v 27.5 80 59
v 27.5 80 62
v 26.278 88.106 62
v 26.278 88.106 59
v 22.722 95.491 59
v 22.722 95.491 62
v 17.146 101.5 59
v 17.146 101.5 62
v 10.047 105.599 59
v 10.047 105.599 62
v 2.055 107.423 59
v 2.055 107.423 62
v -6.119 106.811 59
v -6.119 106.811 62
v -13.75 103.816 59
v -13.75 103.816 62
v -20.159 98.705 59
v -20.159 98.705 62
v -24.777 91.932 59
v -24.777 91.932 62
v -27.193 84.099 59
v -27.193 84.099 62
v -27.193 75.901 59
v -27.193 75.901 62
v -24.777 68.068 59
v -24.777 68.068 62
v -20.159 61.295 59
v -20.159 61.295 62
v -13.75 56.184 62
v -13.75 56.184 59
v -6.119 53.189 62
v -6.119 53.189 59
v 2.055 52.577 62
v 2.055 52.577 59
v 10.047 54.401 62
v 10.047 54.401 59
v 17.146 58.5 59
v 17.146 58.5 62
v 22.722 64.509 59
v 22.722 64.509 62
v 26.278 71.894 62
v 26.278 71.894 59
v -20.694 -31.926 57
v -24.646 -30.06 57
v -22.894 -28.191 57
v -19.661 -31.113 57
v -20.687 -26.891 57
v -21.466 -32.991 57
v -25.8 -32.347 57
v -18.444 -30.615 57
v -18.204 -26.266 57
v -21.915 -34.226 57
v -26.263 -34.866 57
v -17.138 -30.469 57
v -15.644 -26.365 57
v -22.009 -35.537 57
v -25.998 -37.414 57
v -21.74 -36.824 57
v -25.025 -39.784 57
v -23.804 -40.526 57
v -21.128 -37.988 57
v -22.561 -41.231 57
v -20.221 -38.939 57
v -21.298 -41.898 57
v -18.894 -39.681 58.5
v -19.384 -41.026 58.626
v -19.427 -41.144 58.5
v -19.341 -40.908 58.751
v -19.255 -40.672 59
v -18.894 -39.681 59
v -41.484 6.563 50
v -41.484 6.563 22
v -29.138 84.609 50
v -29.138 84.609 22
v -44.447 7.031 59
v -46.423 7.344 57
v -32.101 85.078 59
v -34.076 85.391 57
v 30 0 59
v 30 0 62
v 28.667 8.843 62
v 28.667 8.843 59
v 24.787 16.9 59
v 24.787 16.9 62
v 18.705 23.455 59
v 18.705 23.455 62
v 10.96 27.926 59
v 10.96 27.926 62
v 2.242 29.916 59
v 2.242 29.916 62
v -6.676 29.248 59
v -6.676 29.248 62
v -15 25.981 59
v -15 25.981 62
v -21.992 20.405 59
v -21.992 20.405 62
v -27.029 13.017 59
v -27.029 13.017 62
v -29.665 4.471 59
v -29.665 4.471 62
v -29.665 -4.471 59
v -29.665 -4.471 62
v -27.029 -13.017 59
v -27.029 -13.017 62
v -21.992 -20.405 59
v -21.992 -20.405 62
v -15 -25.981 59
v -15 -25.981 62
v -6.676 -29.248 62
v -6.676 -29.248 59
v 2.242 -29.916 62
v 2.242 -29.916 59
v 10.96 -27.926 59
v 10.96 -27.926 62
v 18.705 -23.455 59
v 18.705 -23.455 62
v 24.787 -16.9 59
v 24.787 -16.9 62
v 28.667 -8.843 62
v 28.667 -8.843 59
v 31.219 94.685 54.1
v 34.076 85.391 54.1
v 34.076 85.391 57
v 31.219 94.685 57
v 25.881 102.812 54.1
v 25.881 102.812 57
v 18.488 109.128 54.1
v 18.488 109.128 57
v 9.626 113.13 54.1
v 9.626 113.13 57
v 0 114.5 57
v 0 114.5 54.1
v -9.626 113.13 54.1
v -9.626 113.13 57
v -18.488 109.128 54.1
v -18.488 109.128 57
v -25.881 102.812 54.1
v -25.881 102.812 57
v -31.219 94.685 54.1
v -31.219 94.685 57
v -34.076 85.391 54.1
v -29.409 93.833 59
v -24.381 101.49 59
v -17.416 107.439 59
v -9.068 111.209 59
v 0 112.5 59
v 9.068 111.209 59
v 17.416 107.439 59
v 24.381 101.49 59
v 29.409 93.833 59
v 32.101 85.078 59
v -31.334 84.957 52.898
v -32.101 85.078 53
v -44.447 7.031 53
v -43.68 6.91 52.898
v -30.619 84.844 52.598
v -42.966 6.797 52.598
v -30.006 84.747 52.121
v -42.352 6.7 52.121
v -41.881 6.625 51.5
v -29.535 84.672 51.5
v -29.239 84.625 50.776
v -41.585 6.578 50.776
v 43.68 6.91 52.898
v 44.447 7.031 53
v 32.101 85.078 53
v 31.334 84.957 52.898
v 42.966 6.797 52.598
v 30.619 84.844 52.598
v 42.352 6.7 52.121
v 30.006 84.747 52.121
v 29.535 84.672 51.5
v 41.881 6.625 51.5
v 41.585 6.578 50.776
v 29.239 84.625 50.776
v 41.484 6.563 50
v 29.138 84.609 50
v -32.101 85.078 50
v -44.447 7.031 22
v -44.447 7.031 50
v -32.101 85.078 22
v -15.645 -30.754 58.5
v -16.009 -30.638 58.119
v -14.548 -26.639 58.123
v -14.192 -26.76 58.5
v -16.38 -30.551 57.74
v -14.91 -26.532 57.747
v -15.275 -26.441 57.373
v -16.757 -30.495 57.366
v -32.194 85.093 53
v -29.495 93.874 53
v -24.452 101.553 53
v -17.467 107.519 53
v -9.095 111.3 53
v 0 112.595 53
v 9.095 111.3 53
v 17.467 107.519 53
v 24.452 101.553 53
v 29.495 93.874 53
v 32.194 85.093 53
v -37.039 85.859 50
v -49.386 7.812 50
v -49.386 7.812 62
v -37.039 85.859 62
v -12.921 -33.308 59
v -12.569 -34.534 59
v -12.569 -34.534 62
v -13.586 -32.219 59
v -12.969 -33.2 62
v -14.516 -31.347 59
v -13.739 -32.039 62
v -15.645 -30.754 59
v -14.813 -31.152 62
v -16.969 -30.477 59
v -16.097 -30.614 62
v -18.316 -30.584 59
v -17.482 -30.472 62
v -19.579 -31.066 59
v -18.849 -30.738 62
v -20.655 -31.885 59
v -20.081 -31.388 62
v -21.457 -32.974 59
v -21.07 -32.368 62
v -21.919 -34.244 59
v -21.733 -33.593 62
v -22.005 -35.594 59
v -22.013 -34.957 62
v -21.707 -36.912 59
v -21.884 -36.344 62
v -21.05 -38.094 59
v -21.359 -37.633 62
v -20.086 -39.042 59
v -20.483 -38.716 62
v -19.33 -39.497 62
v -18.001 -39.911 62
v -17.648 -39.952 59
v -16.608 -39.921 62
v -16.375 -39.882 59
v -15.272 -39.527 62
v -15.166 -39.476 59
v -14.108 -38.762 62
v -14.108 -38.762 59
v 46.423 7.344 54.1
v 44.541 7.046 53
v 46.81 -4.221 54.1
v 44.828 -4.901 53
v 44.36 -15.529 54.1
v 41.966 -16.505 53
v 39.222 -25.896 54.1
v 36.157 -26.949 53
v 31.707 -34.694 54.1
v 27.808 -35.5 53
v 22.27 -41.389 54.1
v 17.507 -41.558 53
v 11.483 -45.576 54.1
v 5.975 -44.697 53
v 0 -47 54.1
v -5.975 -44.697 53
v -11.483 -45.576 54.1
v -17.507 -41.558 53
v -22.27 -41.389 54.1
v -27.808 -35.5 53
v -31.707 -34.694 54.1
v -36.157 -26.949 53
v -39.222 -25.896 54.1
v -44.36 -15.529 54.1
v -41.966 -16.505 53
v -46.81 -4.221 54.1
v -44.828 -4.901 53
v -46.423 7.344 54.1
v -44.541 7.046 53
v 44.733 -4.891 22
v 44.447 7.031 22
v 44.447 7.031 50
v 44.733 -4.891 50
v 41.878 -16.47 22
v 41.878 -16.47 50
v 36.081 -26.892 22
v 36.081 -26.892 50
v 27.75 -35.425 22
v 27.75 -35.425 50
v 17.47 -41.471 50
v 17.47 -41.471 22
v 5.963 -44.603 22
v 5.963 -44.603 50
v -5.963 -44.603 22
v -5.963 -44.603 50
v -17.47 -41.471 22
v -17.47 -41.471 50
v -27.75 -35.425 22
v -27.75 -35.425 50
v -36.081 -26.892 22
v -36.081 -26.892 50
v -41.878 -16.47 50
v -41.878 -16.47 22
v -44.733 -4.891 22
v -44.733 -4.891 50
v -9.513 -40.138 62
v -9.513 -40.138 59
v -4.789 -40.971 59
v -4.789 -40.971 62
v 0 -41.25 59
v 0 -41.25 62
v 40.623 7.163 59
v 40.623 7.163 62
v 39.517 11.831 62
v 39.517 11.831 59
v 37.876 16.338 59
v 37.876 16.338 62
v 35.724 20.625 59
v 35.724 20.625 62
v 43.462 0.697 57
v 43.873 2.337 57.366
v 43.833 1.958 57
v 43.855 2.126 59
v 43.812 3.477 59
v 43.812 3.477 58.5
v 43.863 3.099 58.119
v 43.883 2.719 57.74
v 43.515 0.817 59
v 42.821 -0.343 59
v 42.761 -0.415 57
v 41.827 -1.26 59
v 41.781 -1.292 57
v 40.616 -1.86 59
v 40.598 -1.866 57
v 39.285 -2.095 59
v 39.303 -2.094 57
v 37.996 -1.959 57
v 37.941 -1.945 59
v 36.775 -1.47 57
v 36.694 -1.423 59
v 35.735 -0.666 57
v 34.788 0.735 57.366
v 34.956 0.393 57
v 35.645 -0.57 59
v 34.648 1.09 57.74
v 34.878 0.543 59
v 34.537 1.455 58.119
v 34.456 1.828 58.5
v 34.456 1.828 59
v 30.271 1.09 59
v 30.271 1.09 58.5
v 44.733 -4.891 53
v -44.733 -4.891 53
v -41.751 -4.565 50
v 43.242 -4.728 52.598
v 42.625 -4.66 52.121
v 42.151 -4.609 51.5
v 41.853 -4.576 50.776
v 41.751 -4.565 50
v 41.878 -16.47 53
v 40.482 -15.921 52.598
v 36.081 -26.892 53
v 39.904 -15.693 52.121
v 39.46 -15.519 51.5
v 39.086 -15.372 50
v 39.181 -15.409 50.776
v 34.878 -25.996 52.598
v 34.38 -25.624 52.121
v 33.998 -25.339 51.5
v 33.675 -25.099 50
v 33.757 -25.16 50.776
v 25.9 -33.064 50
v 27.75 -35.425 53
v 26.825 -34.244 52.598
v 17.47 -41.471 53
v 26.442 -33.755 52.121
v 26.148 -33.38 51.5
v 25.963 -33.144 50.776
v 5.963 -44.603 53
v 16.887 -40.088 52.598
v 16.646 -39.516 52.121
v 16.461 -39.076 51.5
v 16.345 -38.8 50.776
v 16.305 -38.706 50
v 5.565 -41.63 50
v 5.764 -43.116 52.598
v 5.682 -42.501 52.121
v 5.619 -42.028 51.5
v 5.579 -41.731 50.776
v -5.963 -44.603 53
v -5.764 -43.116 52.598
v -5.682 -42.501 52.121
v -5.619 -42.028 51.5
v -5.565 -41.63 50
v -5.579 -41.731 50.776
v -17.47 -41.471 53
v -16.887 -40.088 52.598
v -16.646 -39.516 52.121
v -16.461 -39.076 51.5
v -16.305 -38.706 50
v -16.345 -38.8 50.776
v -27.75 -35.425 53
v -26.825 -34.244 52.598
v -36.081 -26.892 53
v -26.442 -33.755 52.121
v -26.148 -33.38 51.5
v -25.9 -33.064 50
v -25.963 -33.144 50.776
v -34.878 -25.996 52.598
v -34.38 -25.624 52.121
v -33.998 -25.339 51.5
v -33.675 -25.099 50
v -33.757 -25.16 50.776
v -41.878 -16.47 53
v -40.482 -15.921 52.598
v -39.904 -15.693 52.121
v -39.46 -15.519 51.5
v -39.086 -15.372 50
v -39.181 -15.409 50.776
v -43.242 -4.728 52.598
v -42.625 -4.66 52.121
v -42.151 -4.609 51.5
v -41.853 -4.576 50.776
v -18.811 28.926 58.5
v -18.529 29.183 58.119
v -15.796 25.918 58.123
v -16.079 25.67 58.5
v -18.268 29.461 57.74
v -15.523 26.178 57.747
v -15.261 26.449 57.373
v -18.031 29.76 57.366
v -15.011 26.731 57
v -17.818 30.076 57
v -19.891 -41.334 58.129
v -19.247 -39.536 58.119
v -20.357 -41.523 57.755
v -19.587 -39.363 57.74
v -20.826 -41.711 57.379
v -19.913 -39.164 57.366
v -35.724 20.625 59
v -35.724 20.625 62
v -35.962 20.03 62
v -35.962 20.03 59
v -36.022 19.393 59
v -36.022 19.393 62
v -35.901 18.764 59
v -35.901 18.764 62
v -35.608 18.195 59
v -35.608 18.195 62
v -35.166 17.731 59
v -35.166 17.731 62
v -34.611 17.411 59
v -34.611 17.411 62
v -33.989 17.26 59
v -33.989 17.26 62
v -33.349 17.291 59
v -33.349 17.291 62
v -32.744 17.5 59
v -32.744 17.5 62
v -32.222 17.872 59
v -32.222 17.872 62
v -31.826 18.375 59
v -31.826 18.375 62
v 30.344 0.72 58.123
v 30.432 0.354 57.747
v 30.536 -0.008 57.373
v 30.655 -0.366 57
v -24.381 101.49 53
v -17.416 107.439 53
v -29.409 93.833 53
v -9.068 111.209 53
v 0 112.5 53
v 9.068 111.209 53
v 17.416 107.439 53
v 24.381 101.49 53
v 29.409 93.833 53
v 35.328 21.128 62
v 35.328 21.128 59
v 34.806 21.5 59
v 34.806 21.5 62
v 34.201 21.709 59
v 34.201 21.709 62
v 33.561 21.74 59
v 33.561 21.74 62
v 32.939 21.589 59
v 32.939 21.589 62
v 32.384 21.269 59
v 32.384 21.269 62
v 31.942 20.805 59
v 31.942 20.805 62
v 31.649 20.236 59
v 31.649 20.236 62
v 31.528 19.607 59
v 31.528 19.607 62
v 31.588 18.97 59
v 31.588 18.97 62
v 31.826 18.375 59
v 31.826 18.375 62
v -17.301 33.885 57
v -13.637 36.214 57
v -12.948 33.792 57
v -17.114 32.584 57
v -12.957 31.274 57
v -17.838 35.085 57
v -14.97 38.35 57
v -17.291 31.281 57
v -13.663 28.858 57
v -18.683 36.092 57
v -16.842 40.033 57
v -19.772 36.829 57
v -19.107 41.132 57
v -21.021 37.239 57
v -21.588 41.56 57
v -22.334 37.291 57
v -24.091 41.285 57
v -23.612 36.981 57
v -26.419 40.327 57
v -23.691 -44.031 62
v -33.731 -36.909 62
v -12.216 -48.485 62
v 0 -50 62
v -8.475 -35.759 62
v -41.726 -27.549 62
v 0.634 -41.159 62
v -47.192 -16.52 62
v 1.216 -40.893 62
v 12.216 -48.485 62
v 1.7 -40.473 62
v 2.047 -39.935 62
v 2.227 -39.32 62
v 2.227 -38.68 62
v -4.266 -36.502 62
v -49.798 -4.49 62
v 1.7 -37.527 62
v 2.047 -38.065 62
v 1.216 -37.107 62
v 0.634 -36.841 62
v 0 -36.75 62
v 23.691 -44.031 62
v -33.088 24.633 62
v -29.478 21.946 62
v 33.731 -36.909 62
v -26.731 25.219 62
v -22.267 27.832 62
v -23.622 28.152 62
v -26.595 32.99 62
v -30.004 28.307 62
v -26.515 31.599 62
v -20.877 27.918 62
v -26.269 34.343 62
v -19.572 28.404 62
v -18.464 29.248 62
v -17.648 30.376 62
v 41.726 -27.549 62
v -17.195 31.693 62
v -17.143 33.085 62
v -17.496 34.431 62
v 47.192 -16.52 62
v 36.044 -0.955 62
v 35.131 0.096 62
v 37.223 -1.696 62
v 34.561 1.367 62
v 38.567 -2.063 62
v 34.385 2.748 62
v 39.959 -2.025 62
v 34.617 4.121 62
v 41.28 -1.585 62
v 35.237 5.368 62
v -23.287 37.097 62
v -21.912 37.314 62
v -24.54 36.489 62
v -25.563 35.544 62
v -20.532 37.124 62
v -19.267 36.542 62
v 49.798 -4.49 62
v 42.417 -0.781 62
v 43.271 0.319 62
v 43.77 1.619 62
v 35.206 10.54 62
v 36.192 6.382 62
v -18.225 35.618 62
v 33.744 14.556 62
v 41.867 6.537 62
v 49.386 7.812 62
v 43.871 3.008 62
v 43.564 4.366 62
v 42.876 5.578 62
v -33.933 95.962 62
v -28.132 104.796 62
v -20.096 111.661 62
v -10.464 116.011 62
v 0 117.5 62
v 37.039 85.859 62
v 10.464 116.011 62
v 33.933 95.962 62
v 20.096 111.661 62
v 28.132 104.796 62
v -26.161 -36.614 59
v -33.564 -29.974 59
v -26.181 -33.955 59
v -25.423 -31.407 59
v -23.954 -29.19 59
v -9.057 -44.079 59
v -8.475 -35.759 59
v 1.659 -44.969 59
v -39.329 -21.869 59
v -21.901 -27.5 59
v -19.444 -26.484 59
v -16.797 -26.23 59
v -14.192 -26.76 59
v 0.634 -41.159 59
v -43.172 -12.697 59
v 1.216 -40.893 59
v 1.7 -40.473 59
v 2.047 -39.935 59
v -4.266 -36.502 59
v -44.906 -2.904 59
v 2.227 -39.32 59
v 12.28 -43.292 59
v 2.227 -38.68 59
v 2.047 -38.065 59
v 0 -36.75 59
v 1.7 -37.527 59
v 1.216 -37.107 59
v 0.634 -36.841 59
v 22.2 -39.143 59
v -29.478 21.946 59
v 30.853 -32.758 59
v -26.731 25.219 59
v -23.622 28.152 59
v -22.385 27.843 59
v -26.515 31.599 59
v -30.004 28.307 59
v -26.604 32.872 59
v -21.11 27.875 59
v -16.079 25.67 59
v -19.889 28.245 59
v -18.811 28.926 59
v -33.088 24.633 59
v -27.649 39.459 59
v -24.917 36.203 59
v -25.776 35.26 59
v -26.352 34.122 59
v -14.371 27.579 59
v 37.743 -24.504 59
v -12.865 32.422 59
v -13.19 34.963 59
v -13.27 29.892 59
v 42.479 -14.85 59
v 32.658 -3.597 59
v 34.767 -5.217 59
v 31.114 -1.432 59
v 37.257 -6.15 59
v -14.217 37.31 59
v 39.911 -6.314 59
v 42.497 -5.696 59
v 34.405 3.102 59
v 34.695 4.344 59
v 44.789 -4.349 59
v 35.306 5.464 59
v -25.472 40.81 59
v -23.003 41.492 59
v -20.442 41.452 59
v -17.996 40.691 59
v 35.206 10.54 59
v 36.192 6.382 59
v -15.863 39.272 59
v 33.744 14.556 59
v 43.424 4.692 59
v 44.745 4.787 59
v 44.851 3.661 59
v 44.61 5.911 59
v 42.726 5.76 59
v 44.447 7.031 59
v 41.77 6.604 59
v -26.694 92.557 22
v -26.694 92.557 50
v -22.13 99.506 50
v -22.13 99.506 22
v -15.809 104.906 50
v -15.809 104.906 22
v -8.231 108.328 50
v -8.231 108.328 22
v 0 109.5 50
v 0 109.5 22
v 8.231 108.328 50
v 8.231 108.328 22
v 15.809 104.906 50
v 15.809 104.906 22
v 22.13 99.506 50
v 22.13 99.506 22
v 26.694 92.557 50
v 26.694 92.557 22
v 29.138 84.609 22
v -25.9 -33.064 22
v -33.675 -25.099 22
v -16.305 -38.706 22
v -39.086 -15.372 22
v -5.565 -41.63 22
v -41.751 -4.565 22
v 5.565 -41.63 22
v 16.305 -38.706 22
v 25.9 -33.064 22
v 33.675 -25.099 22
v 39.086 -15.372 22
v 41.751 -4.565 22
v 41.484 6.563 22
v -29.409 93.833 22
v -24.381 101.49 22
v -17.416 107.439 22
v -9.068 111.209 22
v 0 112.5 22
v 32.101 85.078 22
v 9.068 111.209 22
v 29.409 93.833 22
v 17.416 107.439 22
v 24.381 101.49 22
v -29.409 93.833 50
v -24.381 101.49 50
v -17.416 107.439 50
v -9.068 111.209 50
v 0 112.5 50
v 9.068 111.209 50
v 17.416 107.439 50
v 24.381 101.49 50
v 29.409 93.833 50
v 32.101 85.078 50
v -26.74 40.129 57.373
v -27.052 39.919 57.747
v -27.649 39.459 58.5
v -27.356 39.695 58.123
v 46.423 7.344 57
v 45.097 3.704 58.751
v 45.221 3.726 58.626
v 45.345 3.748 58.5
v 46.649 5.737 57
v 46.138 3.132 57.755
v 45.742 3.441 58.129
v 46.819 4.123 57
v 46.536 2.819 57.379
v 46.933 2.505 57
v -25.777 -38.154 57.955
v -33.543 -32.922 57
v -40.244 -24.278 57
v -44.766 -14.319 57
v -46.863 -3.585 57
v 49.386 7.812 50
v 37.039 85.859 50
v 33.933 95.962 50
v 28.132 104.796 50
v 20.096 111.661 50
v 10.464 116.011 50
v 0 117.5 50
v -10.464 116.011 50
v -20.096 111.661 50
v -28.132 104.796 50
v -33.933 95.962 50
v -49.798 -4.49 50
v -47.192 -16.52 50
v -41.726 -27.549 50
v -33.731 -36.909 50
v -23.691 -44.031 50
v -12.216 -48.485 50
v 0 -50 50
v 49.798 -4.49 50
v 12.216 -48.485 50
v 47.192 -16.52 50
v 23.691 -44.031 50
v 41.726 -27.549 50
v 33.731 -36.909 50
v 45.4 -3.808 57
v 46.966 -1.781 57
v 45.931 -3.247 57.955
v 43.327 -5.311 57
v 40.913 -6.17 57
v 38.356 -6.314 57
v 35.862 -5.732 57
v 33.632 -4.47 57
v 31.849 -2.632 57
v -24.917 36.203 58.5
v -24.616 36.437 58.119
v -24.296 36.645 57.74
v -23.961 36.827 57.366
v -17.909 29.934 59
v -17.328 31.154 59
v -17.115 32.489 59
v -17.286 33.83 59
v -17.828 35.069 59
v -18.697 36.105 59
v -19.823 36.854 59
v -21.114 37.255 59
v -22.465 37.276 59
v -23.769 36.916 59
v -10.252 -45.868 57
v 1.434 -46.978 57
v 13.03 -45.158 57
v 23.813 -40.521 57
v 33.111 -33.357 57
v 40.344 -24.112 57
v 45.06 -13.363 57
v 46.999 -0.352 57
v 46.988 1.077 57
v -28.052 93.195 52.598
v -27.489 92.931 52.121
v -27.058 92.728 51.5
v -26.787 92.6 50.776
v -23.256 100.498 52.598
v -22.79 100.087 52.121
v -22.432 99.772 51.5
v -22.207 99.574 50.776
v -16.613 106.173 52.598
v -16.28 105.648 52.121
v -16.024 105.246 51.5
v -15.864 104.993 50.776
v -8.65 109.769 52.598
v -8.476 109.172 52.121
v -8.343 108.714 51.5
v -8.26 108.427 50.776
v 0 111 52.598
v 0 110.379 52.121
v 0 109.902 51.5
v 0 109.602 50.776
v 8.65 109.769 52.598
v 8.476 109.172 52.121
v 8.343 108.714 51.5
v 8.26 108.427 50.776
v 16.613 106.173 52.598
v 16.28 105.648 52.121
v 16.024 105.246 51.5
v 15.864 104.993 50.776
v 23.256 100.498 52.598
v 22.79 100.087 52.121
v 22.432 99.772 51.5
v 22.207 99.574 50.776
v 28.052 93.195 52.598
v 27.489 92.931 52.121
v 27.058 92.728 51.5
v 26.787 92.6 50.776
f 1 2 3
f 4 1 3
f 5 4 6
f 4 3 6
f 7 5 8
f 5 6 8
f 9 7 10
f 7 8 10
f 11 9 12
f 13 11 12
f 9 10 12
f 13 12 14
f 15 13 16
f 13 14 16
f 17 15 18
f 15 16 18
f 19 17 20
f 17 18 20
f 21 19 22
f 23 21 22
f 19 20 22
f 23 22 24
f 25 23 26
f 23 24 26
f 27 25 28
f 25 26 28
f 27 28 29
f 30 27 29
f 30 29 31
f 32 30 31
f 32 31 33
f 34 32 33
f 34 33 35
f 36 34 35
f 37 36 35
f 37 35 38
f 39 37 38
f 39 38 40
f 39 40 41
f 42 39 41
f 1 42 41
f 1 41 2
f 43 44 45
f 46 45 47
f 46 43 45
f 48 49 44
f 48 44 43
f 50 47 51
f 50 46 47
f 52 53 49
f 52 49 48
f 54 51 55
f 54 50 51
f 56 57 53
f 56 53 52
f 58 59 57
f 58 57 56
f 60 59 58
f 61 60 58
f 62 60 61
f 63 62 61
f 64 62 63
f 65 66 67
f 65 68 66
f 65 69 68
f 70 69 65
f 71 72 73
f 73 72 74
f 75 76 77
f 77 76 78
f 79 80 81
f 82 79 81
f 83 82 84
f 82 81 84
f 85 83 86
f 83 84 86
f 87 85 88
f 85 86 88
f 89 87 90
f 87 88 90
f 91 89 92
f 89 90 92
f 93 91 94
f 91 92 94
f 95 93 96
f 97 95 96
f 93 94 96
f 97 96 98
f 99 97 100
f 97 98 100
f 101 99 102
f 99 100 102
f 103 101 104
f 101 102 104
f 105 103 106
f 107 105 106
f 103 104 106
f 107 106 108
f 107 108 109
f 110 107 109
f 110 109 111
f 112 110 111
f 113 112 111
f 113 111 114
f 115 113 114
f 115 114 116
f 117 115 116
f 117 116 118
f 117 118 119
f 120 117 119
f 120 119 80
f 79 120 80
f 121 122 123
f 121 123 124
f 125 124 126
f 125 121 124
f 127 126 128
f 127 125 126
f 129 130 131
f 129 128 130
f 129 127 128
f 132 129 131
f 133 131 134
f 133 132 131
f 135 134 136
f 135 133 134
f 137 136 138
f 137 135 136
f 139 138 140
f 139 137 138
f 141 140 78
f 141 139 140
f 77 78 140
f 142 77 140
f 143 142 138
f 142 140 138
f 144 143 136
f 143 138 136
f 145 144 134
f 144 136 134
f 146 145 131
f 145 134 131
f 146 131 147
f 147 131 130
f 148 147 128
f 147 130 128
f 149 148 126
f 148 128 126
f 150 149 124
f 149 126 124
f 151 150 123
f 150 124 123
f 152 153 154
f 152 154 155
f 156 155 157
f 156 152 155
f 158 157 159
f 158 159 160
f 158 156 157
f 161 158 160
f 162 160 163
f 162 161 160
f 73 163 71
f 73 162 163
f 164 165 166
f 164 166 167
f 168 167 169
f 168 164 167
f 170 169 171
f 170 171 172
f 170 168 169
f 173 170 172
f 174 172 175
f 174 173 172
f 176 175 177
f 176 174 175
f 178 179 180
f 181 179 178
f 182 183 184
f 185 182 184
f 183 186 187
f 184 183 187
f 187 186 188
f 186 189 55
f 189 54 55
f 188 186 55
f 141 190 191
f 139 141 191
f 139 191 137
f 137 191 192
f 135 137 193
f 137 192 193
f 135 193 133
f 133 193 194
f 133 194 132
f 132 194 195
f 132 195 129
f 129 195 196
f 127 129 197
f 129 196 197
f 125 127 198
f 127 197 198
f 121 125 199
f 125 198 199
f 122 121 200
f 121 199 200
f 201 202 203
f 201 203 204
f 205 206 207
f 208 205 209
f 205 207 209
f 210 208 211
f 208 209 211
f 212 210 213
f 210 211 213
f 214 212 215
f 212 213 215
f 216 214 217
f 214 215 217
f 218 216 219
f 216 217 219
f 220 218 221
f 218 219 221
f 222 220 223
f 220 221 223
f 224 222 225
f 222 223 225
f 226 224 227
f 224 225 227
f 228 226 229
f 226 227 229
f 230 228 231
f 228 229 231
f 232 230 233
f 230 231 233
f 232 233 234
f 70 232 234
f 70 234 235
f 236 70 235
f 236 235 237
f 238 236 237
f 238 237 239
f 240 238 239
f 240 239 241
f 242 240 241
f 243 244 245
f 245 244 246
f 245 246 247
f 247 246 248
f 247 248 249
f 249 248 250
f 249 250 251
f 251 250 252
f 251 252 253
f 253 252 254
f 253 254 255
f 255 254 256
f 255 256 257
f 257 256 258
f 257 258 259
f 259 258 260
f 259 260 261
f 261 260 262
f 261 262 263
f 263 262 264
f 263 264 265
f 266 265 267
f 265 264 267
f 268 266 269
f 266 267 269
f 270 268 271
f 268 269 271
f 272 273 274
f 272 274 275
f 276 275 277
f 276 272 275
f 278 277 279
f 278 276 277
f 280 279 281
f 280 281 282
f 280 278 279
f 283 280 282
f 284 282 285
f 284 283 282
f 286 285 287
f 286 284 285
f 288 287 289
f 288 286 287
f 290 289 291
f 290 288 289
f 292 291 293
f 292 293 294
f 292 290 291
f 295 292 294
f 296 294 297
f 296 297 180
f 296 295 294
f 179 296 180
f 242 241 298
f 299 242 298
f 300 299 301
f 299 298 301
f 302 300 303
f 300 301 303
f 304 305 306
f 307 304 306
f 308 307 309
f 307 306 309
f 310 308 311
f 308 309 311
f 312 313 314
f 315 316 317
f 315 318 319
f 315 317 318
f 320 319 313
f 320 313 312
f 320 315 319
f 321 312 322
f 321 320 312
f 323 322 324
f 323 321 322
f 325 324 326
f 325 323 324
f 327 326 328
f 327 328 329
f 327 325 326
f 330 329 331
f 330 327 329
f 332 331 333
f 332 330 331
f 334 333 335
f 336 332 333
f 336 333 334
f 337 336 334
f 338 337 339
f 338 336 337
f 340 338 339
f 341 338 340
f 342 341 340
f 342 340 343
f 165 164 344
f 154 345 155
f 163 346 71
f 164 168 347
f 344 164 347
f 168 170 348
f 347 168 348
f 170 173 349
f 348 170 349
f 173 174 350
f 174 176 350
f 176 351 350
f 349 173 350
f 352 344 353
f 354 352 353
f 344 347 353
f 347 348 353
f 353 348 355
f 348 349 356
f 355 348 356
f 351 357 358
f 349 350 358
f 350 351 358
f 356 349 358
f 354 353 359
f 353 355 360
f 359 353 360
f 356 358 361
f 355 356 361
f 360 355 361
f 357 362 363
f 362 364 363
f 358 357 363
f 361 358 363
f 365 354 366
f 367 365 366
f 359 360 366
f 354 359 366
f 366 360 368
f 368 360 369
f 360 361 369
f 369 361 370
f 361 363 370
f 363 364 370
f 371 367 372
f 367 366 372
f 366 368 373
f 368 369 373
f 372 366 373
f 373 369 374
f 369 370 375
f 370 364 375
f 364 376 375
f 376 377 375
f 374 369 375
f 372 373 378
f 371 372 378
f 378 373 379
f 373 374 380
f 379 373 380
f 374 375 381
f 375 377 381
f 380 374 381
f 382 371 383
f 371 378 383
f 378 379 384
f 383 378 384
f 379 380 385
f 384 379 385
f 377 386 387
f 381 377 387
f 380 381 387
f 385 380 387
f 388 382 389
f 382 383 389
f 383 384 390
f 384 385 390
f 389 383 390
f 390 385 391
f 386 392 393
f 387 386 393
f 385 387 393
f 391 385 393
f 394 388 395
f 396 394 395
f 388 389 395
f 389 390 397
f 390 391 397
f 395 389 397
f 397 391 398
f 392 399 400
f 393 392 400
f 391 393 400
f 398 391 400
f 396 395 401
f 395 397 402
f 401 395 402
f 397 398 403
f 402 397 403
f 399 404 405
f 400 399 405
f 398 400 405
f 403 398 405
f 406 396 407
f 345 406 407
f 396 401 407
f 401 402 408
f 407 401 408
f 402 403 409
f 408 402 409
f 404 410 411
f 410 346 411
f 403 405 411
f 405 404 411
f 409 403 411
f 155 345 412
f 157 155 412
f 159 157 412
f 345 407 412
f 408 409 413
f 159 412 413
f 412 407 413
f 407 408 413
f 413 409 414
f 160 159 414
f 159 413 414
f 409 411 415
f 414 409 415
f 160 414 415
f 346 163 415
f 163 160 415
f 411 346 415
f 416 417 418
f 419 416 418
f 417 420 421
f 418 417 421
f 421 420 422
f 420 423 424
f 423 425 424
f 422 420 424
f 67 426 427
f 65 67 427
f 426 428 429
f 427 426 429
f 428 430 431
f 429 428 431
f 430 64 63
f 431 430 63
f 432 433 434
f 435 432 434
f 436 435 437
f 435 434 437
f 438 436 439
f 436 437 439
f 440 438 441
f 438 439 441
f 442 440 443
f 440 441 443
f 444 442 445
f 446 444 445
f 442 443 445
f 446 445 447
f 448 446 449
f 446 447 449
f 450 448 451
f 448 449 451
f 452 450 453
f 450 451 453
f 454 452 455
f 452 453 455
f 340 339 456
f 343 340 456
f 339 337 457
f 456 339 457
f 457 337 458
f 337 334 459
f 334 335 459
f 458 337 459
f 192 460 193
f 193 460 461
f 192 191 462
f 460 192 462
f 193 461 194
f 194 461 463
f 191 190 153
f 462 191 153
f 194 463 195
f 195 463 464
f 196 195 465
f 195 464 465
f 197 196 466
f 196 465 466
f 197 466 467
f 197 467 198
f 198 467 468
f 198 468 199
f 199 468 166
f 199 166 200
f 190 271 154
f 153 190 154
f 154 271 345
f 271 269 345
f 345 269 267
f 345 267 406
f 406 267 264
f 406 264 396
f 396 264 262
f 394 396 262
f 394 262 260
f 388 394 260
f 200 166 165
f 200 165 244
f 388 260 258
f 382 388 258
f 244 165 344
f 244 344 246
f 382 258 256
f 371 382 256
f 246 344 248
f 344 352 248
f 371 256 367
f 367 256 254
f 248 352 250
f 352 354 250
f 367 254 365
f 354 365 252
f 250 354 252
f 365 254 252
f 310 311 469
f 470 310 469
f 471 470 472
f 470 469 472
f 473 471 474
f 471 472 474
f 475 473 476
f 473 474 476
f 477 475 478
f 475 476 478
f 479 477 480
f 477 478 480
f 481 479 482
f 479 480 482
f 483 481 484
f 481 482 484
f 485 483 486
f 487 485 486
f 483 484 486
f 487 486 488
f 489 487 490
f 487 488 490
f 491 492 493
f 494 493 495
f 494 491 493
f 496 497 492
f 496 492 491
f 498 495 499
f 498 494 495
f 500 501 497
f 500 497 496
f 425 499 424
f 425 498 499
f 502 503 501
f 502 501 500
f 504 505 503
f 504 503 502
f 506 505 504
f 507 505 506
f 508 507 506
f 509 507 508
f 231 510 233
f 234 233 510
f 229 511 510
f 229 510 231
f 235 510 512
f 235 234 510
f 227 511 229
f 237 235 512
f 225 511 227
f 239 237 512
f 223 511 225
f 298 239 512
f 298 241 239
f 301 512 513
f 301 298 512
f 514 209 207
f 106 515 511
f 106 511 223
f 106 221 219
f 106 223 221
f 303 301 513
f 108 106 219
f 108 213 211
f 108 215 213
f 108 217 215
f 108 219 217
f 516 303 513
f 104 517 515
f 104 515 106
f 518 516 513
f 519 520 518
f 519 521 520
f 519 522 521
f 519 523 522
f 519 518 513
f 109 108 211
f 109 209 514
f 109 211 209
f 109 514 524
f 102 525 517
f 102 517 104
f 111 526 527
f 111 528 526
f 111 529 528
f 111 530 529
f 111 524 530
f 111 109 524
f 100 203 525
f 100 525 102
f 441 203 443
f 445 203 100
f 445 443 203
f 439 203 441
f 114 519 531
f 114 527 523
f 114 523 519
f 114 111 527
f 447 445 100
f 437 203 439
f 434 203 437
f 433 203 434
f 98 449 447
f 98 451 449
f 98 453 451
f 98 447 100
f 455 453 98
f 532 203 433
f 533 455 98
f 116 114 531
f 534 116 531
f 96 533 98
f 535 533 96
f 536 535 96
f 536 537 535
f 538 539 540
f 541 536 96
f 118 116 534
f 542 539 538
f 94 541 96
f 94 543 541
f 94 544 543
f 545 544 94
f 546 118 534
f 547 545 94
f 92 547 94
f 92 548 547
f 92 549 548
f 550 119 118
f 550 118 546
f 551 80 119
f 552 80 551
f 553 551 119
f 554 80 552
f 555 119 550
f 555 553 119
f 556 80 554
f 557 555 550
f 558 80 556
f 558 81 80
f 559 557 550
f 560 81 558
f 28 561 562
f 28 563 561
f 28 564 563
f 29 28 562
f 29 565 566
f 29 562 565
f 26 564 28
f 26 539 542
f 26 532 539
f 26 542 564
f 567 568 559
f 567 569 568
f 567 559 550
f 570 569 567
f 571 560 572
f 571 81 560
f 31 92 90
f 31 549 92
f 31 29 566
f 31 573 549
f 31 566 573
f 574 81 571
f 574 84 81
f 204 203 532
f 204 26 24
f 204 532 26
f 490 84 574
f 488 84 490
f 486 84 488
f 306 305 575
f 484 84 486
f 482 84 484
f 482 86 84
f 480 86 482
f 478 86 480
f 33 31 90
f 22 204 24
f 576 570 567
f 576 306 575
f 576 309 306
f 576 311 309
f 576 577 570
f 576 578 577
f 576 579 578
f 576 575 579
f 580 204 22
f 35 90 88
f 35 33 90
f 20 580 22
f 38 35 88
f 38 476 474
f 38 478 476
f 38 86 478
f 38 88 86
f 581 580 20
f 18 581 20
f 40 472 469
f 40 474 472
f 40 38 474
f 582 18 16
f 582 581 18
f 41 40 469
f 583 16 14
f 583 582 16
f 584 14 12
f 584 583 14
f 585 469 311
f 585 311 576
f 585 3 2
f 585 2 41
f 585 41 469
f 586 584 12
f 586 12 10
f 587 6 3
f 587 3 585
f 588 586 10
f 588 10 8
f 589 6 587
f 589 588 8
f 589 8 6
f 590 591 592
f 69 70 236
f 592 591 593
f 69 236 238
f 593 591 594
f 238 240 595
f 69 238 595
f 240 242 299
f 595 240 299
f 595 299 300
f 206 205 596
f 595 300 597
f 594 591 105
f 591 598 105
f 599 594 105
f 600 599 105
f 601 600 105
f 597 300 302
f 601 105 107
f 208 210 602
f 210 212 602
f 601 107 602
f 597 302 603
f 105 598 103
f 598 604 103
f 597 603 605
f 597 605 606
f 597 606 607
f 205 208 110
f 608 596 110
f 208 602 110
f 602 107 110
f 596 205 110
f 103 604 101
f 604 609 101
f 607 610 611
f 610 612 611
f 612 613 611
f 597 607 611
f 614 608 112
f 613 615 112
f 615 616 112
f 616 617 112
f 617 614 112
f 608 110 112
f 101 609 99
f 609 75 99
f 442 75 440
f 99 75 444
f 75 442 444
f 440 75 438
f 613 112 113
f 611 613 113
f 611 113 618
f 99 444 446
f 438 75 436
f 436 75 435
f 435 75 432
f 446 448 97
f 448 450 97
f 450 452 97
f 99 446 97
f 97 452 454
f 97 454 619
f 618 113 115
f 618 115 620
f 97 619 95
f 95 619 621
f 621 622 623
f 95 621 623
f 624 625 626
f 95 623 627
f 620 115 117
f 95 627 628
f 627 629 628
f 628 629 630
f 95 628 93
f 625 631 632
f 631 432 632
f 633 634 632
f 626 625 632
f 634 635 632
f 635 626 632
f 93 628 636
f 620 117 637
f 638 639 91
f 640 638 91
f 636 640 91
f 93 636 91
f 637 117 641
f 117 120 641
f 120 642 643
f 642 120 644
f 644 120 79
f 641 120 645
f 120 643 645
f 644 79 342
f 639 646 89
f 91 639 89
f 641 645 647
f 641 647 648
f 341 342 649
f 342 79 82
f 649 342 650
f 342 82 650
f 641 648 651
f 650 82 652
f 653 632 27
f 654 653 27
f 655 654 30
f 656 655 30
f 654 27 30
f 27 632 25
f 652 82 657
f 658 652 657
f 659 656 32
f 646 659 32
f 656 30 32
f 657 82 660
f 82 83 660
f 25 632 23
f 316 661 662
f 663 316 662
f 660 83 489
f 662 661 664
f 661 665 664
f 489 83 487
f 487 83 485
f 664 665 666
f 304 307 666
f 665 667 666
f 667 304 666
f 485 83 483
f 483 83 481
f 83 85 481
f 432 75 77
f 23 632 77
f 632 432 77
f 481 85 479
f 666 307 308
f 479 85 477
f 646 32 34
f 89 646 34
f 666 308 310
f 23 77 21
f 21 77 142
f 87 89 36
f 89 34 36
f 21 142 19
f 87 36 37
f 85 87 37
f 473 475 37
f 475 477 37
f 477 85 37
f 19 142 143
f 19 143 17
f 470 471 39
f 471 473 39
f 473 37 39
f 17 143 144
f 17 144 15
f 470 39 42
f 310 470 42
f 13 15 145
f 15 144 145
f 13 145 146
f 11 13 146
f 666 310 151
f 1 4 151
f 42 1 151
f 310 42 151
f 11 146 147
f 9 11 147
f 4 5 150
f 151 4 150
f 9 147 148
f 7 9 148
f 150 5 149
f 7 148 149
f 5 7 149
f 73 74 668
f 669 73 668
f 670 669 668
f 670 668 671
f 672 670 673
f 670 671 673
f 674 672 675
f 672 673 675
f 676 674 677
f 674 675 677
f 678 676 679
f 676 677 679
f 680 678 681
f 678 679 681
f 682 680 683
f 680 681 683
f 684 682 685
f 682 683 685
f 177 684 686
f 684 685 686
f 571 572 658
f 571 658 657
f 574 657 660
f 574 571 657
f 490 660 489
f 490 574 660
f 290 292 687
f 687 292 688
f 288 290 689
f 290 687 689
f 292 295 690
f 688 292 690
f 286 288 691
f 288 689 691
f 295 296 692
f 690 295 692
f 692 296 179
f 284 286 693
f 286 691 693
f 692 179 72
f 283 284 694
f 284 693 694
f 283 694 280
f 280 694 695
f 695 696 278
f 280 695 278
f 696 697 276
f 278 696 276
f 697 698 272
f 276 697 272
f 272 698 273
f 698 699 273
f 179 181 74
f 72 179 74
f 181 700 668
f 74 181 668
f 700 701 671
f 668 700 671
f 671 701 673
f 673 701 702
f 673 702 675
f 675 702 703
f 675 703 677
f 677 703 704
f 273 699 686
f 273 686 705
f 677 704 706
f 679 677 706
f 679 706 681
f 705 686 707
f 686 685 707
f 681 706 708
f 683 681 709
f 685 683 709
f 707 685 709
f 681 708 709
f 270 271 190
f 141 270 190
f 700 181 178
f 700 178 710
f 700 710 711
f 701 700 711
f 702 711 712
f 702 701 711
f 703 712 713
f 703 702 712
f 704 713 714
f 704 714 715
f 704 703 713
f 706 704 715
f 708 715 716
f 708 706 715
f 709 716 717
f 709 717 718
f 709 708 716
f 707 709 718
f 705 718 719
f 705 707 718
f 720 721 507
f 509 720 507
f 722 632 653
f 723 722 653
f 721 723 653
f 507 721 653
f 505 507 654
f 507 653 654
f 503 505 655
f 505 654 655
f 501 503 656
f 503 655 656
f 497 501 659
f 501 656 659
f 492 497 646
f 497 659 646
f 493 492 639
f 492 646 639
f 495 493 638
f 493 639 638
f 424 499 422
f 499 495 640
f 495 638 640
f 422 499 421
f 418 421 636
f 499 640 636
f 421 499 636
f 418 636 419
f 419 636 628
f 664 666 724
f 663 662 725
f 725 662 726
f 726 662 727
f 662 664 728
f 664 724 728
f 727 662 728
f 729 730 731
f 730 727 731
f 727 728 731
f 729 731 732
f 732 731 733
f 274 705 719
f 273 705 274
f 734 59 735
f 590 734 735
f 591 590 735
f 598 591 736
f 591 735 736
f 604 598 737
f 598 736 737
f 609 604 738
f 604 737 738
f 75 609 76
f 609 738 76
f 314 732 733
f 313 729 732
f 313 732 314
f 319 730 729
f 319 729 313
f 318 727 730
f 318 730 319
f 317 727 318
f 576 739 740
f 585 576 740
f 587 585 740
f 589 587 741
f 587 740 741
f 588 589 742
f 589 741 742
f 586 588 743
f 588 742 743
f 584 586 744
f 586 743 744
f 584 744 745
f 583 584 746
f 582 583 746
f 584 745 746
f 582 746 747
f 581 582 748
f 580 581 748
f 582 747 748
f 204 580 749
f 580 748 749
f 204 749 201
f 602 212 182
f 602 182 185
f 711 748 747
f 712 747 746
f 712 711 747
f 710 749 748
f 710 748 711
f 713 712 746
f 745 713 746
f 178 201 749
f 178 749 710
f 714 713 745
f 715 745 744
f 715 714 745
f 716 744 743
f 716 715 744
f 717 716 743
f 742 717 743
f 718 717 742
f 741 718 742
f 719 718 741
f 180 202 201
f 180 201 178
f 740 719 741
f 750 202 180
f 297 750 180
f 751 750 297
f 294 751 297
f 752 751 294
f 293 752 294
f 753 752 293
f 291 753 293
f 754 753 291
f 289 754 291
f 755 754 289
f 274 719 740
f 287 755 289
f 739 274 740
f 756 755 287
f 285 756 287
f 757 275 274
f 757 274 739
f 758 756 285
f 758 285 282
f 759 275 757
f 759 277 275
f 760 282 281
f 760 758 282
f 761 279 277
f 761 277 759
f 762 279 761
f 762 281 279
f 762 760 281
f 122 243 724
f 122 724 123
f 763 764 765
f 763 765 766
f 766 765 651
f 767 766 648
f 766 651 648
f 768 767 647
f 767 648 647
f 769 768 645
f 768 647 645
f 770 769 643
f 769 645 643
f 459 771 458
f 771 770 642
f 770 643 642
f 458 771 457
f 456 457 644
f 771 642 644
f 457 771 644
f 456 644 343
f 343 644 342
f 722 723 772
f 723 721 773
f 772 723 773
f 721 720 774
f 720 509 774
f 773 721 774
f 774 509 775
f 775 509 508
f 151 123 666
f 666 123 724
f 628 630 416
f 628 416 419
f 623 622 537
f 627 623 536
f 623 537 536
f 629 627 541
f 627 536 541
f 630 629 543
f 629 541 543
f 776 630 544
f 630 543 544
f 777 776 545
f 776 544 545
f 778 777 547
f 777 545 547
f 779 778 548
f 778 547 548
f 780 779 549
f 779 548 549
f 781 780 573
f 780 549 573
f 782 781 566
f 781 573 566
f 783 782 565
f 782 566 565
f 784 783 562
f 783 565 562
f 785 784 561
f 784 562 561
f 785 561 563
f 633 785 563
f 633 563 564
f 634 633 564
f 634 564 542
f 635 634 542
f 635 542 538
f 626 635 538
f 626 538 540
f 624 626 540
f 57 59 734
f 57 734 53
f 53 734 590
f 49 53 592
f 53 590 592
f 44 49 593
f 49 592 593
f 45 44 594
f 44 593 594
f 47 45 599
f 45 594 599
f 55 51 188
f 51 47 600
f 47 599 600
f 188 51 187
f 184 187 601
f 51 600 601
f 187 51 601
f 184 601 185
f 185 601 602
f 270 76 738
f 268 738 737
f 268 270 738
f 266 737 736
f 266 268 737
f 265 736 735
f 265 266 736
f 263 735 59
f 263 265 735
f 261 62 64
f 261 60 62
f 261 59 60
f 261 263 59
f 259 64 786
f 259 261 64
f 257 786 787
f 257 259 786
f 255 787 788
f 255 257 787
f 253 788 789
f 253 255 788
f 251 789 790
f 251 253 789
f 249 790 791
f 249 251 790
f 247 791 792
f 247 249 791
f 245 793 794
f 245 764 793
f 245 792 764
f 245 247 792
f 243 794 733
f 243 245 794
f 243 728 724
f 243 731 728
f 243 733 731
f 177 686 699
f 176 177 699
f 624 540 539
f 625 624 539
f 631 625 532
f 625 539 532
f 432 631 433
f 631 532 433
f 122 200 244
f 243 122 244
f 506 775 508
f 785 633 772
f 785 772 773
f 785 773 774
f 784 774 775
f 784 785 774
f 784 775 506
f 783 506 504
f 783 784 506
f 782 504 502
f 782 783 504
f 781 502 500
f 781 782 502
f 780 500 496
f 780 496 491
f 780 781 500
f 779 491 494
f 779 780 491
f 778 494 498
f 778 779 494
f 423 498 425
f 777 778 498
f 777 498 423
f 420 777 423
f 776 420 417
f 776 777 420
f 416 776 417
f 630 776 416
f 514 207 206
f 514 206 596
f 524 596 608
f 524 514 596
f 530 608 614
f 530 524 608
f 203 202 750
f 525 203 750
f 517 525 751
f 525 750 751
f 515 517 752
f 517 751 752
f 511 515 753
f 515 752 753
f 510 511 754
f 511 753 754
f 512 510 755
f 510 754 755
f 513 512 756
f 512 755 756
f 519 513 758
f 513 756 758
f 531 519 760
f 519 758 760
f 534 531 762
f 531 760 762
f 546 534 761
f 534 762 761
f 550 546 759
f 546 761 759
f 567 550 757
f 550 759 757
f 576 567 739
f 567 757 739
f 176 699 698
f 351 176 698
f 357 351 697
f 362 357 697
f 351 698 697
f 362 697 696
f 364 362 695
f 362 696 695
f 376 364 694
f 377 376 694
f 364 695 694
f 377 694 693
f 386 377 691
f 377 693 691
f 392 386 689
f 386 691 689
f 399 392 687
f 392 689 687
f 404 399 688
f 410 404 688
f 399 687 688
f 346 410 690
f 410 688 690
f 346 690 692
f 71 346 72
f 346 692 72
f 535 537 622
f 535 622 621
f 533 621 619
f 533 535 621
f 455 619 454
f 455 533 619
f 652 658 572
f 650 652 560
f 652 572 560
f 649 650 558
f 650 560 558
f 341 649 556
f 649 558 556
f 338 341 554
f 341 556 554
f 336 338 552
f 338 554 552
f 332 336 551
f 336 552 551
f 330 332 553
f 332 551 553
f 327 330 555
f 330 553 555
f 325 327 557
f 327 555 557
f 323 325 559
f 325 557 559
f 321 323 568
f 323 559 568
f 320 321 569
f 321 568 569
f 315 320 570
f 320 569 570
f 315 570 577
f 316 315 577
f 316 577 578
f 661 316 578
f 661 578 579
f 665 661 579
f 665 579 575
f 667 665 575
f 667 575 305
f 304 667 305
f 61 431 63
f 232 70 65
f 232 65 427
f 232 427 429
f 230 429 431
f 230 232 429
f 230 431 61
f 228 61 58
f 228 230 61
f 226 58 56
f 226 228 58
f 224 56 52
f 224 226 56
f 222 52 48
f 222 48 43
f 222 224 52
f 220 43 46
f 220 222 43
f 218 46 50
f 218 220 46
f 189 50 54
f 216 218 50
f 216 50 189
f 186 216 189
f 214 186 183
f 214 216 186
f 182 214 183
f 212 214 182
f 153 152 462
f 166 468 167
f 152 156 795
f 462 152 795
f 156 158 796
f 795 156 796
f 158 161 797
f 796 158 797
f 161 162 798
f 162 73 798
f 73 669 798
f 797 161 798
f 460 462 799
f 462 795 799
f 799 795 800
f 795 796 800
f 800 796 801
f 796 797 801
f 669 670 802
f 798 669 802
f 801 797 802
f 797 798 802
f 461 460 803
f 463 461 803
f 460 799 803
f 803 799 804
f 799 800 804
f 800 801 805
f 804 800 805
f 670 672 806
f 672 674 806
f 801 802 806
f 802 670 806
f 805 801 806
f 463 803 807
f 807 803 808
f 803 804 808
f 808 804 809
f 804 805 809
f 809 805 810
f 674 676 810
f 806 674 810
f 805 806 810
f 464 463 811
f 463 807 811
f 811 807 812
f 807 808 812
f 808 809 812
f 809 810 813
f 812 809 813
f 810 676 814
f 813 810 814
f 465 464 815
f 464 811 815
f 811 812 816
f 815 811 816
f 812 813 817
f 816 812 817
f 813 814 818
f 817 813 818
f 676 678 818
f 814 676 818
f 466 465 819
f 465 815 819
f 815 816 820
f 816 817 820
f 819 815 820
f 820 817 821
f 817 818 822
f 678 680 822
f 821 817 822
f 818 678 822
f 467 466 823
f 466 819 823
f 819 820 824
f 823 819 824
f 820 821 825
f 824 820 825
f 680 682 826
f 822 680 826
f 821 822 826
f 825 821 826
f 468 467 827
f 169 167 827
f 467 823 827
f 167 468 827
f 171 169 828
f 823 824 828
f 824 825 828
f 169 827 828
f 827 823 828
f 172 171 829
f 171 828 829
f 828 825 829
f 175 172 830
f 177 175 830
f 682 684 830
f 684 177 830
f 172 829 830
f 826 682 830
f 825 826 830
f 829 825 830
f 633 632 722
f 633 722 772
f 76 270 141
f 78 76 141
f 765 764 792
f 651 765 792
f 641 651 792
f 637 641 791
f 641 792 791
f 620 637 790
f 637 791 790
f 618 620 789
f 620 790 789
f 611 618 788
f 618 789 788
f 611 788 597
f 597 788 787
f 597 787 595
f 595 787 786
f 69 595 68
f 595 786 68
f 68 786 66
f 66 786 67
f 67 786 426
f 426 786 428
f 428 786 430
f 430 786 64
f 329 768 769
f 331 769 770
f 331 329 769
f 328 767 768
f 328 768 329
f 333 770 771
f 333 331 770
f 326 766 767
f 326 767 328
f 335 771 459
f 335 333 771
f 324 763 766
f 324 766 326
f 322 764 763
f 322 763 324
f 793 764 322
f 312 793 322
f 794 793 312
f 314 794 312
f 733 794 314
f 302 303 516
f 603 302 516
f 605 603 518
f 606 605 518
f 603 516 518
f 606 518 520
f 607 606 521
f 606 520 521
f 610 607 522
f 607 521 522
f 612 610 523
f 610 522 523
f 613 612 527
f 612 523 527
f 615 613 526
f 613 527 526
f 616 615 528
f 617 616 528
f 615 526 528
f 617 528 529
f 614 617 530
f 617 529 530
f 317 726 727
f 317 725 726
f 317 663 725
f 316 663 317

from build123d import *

# Parameters (mm, degrees)
PAD_DEPTH             = 40
SKETCH004_R           = 150
POCKET001_DEPTH       = 28
THICKNESS_T           = -3
SKETCH003_R           = 27.5
SKETCH003_R_2         = 30
POCKET002_DEPTH       = 40.001
POCKET003_DEPTH       = 5
POLARPATTERN_COUNT    = 3
CHAMFER_ANGLE         = 60
CHAMFER_SIZE          = 1.1
CHAMFER003_SIZE       = 2
PAD004_DEPTH          = 2
POLARPATTERN002_COUNT = 3
CHAMFER004_SIZE       = 1.5


with BuildPart() as part:
    # Sketch002 → Pad (new body)
    with BuildSketch(Plane.XY.offset(22)):
        with BuildLine():
            ThreePointArc((-49.385877, 7.8125), (0, -50), (49.385877, 7.8125))
            Line((49.385877, 7.8125), (37.039408, 85.859375))
            ThreePointArc((37.039408, 85.859375), (0, 117.5), (-37.039408, 85.859375))
            Line((-49.385877, 7.8125), (-37.039408, 85.859375))
        make_face()
    extrude(amount=PAD_DEPTH)

    # Sketch004 (on Face5 of Pad) → Pocket001 (cut)
    with BuildSketch(Plane(origin=(0, 0, 22), x_dir=(1, 0, 0), z_dir=(0, 0, -1))):
        Circle(SKETCH004_R)
        with BuildLine():
            ThreePointArc((-32.10082, -85.078125), (0, -112.5), (32.10082, -85.078125))
            Line((32.10082, -85.078125), (44.447289, -7.03125))
            ThreePointArc((44.447289, -7.03125), (0, 45), (-44.447289, -7.03125))
            Line((-44.447289, -7.03125), (-32.10082, -85.078125))
        make_face(mode=Mode.SUBTRACT)
    extrude(amount=-POCKET001_DEPTH, mode=Mode.SUBTRACT)

    # Thickness
    thickness_openings = [part.faces().sort_by_distance(p)[0] for p in [
        (0, 29.917579, 22),
    ]]
    offset(amount=THICKNESS_T, openings=thickness_openings)

    # Sketch003 (on Face6 of Pad) → Pocket002 (cut, through all)
    with BuildSketch(Plane.XY.offset(62)):
        with Locations((0, 80)):
            Circle(SKETCH003_R)
        Circle(SKETCH003_R_2)
    extrude(amount=-POCKET002_DEPTH, mode=Mode.SUBTRACT)

    # Sketch005 (on Face4 of Pocket002) → Pocket003 (cut)
    with BuildSketch(Plane.XY.offset(62)):
        with BuildLine():
            ThreePointArc((0, -41.25), (2.25, -39), (0, -36.75))
            ThreePointArc((-12.56924, -34.533704), (-6.381571, -36.191685), (0, -36.75))
            ThreePointArc((-12.56924, -34.533704), (-21.733342, -33.592644), (-14.108331, -38.762321))
            ThreePointArc((-14.108331, -38.762321), (-7.162987, -40.62332), (0, -41.25))
        make_face()
    pocket003 = extrude(amount=-POCKET003_DEPTH, mode=Mode.SUBTRACT)

    # PolarPattern: Pocket003 ×3 about axis
    polarpattern_axis = Axis((0, 0, 62), (0, 0, 1))
    for i in range(1, POLARPATTERN_COUNT):
        add(pocket003.rotate(polarpattern_axis, i * 360 / POLARPATTERN_COUNT), mode=Mode.SUBTRACT)

    # Chamfer
    chamfer_edges = [part.edges().sort_by_distance(p)[0] for p in [
        (0, 114.5, 53),
    ]]
    chamfer_side = part.faces().sort_by_distance((0, 114.5, 56))[0]
    chamfer(chamfer_edges, length=CHAMFER_SIZE, angle=CHAMFER_ANGLE, reference=chamfer_side)

    # Chamfer003
    chamfer003_edges = [part.edges().sort_by_distance(p)[0] for p in [
        (0, -47, 59),
    ]]
    chamfer(chamfer003_edges, length=CHAMFER003_SIZE)

    # Sketch013 (on Face9 of Chamfer003) → Pad004 (join)
    with BuildSketch(Plane(origin=(0, 0, 59), x_dir=(1, 0, 0), z_dir=(0, 0, -1))):
        with BuildLine():
            ThreePointArc((-20.347983, 43.674473), (-25.727035, 32.139058), (-14.191621, 26.760006))
            Line((-15.645206, 30.753699), (-14.191621, 26.760006))
            ThreePointArc((-18.894398, 39.680779), (-21.733342, 33.592644), (-15.645206, 30.753699))
            Line((-20.347983, 43.674473), (-18.894398, 39.680779))
        make_face()
    pad004 = extrude(amount=PAD004_DEPTH)

    # PolarPattern002: Pad004 ×3 about axis
    polarpattern002_axis = Axis((0, 0, 59), (0, 0, -1))
    for i in range(1, POLARPATTERN002_COUNT):
        add(pad004.rotate(polarpattern002_axis, i * 360 / POLARPATTERN002_COUNT))

    # Chamfer004
    chamfer004_edges = [part.edges().sort_by_distance(p)[0] for p in [
        (-17.444958, 27.298151, 57),
        (-26.283288, 37.831262, 57),
        (-19.41828, -41.120134, 57),
        (-14.918413, -28.756853, 57),
        (45.320221, 3.743343, 57),
        (32.363372, 1.458701, 57),
    ]]
    chamfer(chamfer004_edges, length=CHAMFER004_SIZE)


solid = part.part
